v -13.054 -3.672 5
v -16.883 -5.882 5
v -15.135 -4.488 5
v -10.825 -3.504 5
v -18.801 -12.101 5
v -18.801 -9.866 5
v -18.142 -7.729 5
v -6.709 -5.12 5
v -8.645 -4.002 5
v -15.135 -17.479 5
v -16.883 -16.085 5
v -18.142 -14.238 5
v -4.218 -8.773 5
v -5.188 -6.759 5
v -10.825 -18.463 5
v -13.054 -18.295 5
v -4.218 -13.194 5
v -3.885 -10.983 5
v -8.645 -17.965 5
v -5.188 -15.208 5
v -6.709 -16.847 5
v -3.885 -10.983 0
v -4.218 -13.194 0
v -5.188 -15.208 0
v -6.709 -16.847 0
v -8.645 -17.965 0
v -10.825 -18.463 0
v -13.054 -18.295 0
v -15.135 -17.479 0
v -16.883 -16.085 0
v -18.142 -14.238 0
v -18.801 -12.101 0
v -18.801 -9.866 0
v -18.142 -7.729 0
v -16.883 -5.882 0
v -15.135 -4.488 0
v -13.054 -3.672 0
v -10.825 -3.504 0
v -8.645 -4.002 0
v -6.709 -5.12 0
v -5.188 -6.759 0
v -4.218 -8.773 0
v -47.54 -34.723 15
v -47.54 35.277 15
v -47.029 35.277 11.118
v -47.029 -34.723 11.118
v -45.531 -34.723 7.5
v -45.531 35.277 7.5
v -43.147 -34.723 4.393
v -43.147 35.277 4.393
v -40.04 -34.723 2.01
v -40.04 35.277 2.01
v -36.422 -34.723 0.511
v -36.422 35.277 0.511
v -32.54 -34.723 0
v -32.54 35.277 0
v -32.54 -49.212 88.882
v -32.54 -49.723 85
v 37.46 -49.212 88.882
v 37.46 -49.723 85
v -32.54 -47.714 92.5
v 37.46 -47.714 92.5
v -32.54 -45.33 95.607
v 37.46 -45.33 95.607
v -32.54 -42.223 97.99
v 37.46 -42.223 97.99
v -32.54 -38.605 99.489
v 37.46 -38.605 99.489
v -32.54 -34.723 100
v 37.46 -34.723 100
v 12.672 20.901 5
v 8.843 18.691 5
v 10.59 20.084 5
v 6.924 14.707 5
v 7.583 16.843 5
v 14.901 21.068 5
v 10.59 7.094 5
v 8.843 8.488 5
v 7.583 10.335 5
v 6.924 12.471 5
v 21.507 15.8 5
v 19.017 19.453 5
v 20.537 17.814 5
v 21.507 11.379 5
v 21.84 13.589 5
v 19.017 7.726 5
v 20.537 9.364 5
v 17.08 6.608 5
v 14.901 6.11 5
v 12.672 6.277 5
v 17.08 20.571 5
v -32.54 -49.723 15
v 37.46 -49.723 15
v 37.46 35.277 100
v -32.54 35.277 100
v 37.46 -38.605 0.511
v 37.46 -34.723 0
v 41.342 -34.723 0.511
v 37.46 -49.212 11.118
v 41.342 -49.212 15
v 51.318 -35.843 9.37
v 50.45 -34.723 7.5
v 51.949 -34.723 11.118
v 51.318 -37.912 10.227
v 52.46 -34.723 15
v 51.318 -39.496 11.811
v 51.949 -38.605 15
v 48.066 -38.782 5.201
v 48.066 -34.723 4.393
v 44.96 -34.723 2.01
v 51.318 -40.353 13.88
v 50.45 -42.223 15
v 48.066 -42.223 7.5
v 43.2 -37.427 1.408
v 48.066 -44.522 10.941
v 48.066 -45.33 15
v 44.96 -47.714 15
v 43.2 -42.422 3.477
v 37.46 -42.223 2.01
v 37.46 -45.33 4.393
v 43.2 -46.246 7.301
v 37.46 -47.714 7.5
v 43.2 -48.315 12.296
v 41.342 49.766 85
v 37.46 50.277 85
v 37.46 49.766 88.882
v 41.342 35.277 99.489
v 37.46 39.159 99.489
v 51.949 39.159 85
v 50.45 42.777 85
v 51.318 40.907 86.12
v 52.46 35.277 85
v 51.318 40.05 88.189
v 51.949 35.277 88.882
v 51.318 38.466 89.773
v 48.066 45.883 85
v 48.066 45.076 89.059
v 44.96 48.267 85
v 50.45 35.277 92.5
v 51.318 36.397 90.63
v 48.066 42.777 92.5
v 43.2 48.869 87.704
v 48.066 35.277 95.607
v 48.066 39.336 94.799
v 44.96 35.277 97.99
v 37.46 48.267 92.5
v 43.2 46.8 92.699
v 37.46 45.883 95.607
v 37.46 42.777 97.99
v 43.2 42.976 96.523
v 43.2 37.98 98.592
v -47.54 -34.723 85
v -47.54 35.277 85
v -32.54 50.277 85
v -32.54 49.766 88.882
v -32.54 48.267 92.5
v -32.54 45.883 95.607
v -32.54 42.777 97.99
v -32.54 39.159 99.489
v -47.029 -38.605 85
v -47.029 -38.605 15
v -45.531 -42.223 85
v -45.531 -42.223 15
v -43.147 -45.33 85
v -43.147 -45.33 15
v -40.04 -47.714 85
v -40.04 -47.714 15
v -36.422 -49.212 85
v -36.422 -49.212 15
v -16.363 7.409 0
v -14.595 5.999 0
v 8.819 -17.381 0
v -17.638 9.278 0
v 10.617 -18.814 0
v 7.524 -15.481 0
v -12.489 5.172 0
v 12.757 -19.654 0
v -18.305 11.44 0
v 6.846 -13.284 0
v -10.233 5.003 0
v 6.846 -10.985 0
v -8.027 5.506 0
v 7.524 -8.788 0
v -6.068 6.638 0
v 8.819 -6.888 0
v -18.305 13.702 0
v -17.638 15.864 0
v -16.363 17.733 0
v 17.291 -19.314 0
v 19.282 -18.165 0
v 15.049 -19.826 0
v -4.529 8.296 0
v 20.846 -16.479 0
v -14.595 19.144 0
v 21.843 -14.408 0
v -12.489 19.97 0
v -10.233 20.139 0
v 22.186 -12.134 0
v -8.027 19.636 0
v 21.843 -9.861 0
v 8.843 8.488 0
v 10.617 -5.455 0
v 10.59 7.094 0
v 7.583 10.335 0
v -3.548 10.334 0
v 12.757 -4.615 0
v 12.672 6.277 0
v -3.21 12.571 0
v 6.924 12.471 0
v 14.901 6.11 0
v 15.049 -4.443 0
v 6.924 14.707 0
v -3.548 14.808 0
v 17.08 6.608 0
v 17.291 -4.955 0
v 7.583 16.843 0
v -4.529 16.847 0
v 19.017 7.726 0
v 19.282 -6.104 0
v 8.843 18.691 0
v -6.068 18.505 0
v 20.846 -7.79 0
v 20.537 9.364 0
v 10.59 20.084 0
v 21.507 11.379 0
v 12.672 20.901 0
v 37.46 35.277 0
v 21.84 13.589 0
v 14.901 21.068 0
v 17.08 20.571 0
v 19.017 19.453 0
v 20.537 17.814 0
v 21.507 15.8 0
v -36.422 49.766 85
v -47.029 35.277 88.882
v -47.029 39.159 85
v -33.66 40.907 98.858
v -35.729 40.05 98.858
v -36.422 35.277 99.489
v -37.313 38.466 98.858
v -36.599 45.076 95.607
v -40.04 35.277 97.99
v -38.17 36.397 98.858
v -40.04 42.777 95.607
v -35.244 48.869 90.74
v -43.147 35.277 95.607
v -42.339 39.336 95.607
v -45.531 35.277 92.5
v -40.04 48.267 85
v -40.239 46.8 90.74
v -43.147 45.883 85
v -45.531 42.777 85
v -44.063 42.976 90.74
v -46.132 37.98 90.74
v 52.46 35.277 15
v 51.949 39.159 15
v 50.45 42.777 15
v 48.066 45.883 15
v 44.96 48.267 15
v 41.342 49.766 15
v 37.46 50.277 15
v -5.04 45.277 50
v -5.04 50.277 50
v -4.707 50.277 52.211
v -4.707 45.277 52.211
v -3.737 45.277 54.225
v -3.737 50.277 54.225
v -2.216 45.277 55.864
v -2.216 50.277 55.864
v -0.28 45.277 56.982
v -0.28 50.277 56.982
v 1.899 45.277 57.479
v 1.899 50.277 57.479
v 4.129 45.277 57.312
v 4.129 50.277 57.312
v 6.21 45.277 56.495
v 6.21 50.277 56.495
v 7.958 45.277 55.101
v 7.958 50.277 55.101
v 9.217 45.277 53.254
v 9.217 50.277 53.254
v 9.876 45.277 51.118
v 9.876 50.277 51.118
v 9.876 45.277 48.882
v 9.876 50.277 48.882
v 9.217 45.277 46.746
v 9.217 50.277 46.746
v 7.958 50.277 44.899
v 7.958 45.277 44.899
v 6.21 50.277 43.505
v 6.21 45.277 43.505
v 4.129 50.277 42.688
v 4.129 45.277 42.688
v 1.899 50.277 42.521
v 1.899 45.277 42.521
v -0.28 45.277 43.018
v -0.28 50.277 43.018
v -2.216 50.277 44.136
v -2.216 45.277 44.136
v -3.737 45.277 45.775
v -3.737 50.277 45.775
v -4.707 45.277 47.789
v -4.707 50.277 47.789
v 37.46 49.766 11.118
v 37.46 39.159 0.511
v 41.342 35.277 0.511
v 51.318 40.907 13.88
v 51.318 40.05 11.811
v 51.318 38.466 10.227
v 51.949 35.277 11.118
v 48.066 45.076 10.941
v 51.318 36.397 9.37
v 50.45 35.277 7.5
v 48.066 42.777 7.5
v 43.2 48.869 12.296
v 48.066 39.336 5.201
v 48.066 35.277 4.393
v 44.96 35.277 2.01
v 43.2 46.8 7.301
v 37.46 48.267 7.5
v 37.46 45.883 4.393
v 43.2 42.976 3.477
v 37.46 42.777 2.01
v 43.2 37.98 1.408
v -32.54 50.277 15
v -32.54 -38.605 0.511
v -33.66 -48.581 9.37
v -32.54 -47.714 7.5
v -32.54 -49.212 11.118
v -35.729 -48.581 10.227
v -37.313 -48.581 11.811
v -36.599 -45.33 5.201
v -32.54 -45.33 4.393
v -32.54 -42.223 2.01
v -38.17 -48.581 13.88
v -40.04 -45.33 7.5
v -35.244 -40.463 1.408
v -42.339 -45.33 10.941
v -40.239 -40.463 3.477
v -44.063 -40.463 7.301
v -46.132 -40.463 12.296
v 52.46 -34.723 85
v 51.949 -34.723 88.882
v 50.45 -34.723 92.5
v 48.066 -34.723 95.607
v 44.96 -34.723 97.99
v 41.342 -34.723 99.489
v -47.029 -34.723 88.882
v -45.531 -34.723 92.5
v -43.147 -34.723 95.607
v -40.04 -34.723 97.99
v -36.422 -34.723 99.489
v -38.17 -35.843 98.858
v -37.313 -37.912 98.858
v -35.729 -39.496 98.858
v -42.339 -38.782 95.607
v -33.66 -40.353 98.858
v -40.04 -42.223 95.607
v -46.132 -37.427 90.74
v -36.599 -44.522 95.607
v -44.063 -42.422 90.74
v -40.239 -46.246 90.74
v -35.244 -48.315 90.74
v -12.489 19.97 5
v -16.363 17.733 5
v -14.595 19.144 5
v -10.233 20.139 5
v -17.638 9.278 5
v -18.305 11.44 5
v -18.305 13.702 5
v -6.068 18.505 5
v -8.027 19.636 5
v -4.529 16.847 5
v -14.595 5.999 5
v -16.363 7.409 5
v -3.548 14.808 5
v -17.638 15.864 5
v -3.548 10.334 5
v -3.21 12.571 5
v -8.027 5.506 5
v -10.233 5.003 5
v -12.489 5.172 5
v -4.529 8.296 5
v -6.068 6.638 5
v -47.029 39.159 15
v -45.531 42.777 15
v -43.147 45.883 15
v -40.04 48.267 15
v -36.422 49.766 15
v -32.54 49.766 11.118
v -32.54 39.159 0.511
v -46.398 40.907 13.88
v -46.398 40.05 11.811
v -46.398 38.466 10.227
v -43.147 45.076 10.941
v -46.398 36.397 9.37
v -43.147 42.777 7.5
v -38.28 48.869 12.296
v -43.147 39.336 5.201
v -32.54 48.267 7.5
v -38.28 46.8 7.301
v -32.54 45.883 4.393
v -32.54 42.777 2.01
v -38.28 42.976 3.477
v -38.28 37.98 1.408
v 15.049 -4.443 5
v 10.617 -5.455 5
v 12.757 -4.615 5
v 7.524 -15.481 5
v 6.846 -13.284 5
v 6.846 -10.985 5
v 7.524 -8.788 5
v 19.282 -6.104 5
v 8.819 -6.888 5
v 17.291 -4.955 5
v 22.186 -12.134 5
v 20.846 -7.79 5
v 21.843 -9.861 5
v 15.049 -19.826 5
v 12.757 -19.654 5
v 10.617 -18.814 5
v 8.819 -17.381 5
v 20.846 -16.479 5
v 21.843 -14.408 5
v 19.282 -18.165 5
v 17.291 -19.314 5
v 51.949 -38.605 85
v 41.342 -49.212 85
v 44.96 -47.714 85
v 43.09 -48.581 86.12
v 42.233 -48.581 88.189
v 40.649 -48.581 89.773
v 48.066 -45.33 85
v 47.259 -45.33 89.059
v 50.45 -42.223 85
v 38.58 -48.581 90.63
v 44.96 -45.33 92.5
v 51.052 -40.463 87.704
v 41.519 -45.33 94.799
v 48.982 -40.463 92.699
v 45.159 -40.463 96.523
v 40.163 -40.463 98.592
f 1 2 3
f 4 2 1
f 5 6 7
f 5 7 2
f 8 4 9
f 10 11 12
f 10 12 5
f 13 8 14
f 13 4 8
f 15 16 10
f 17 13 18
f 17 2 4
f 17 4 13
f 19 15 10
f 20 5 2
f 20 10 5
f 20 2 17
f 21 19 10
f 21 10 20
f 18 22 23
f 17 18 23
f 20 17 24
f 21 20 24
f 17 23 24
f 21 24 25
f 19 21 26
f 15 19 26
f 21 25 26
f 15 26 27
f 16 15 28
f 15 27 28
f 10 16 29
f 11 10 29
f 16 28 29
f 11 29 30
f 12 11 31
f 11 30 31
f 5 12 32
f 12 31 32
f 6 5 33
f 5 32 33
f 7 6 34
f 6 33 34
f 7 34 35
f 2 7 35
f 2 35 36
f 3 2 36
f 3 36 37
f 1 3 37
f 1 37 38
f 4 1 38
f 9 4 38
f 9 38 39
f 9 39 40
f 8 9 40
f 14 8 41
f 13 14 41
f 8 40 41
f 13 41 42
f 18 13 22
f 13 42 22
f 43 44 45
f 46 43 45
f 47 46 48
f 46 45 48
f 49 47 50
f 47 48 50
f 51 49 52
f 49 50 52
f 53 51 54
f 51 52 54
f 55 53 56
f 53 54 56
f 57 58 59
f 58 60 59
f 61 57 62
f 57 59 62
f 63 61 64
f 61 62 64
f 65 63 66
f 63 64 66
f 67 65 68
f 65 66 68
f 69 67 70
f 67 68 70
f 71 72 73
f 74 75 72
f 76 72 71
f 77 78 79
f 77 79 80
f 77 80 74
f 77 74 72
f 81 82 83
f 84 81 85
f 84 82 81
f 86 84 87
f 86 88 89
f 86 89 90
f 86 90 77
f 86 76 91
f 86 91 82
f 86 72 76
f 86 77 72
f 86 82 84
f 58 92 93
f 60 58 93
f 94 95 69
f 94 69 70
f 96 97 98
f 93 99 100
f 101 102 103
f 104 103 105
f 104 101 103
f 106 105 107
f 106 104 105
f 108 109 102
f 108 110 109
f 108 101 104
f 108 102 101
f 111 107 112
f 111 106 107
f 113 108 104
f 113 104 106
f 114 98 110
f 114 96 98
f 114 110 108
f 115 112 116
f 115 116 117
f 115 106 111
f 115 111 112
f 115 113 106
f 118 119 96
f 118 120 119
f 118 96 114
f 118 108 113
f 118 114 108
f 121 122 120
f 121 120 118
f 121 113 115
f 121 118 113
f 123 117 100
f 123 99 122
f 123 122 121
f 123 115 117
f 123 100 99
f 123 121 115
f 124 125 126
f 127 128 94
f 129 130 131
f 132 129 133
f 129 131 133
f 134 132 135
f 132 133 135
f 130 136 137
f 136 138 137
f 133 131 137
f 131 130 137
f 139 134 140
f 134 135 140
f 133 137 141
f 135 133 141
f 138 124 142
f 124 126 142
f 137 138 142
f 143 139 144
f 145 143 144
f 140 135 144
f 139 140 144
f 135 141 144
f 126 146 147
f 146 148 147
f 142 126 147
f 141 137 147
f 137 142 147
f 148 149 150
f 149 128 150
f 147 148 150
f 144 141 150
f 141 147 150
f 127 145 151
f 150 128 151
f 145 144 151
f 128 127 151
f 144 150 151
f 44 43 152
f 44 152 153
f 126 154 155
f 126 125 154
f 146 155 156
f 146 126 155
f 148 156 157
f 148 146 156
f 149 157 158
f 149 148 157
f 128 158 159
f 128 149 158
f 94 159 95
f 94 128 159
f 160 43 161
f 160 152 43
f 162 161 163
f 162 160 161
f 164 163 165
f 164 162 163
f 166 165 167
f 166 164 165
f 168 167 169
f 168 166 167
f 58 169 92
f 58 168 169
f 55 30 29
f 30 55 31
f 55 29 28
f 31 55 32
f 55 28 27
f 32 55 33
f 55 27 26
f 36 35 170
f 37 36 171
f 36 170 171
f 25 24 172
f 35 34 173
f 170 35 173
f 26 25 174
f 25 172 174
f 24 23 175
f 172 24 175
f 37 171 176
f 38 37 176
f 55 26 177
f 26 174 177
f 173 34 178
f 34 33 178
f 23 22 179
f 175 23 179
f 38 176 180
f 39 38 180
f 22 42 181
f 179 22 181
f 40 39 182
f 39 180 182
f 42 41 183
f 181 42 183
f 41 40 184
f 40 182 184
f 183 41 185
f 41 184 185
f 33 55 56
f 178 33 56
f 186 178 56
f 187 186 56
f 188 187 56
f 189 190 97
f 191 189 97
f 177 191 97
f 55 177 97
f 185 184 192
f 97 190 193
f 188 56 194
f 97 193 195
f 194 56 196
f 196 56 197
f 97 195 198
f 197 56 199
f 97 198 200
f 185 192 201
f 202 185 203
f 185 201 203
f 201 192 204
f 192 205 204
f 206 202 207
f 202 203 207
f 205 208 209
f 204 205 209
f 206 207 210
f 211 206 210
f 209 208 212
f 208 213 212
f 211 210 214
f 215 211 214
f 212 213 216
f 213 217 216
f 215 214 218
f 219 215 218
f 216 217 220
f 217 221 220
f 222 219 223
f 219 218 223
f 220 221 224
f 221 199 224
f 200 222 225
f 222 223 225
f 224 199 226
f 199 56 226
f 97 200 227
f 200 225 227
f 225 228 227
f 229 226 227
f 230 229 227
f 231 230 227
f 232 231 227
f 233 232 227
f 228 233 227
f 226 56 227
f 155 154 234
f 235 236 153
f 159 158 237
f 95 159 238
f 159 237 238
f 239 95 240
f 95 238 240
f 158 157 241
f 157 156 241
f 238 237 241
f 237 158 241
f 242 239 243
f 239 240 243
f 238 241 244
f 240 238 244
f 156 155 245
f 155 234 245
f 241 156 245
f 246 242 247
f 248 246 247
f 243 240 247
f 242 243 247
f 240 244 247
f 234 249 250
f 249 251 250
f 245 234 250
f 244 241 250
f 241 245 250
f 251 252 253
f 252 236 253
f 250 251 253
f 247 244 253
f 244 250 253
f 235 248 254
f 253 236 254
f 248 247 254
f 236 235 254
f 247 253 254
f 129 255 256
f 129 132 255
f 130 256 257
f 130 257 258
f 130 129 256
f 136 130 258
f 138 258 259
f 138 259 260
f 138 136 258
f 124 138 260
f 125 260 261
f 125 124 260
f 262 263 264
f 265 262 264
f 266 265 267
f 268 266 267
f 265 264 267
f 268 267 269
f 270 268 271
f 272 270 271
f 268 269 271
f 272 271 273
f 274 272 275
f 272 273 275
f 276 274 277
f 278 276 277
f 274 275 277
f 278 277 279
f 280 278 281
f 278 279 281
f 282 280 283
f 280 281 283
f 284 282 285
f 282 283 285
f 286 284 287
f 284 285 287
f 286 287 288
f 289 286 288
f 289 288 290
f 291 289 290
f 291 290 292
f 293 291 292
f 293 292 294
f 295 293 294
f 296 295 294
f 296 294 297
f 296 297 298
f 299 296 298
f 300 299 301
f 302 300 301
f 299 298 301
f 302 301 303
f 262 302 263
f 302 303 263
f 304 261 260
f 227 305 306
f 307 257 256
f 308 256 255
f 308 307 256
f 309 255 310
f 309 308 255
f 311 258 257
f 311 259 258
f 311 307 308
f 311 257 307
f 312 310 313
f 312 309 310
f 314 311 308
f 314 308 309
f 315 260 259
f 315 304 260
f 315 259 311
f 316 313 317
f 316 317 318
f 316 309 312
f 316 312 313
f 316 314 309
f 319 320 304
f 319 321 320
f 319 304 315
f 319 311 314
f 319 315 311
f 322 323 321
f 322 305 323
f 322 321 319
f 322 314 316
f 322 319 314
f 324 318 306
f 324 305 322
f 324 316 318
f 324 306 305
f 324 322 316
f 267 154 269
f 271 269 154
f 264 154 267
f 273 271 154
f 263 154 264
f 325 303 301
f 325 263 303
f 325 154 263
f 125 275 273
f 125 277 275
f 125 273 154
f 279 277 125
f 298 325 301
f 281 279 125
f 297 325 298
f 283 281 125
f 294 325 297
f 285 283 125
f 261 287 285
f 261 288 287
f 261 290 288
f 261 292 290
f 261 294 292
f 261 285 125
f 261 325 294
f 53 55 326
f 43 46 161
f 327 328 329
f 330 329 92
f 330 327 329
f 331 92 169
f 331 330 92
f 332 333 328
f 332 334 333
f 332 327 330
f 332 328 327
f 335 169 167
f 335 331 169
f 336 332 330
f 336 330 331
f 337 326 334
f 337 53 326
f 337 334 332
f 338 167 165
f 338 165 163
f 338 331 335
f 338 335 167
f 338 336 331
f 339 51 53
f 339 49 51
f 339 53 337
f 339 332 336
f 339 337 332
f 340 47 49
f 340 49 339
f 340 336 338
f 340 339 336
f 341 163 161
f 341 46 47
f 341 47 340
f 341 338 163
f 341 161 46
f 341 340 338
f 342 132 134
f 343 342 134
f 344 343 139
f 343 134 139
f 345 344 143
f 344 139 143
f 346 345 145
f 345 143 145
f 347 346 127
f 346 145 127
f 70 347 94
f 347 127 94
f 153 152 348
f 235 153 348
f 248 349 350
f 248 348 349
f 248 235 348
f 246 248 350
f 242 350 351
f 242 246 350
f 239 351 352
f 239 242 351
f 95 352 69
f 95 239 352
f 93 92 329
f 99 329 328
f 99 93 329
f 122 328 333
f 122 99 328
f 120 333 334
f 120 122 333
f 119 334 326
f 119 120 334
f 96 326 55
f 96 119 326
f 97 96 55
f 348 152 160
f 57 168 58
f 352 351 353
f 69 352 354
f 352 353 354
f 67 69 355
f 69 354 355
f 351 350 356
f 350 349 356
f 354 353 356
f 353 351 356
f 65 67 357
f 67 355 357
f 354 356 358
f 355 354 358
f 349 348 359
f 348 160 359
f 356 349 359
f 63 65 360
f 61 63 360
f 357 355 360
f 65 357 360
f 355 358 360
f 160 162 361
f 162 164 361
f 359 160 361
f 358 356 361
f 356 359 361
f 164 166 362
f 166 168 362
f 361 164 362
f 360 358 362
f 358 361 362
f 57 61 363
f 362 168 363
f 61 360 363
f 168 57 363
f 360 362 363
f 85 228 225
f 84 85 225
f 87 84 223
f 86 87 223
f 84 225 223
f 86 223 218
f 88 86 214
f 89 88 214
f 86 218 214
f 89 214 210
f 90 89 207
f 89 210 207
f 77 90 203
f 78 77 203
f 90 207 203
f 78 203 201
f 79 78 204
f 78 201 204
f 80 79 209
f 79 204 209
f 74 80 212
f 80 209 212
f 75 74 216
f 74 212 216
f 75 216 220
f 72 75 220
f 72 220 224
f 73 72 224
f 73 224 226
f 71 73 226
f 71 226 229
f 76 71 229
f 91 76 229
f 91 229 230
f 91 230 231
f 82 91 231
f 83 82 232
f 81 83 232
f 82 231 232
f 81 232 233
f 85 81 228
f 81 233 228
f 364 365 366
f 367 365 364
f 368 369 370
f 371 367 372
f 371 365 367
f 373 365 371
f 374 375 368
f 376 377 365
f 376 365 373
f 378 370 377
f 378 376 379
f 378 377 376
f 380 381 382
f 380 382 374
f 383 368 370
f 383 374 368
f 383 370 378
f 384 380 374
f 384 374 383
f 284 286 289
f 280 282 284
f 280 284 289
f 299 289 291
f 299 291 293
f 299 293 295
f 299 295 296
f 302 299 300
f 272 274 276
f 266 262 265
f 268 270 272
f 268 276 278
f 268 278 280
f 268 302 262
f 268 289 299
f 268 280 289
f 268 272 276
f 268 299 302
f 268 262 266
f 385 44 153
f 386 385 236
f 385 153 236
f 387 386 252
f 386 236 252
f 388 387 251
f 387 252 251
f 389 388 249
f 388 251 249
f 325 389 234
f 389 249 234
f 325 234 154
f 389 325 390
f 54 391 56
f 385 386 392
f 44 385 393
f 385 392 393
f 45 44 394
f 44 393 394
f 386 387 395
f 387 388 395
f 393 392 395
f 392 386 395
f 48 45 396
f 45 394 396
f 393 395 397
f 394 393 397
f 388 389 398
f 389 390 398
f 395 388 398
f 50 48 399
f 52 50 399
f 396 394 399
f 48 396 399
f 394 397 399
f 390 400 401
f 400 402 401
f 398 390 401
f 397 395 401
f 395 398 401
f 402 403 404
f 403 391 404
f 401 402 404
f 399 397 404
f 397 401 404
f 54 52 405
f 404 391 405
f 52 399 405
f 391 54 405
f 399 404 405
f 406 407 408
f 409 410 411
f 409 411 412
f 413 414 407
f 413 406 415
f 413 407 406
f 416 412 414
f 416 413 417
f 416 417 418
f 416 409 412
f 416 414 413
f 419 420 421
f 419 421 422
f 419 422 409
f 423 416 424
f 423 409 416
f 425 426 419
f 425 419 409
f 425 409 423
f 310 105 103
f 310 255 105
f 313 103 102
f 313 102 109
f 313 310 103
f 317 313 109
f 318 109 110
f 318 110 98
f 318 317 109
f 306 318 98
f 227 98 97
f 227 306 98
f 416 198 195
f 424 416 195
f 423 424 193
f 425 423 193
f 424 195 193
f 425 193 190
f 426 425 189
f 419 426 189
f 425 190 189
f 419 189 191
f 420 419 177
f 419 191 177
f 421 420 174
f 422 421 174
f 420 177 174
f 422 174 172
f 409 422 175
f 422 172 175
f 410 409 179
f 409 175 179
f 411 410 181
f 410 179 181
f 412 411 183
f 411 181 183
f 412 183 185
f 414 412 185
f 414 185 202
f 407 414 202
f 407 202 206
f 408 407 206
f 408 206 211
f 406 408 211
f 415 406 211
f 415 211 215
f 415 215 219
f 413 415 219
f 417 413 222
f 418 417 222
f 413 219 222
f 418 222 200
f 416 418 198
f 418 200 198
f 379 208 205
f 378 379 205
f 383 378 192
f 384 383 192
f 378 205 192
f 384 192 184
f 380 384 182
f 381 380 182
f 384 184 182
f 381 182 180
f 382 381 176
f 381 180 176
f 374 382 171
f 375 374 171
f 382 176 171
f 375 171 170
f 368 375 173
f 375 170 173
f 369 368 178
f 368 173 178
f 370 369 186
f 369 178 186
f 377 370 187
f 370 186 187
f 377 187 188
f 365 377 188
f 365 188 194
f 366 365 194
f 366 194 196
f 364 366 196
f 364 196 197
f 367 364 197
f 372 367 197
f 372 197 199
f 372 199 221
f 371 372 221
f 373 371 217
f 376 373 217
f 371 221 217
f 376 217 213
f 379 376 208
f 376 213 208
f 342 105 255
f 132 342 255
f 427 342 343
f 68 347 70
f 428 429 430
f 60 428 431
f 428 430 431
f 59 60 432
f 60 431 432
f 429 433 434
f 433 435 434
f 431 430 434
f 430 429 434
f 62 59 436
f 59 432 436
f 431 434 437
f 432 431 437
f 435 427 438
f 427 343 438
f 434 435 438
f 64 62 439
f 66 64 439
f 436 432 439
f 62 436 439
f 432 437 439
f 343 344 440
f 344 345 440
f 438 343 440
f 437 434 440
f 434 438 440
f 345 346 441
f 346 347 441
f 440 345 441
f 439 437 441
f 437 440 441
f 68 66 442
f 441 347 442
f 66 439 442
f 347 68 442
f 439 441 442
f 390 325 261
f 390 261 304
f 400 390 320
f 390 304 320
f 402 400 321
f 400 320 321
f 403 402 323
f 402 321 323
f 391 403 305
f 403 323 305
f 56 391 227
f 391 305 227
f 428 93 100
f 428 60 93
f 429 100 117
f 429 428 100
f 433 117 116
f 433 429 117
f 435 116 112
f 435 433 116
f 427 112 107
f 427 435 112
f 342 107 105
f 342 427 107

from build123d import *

# Parameters (mm, degrees)
F0_W     = 100
F0_H     = 100
F1_DEPTH = 100
F2_R     = 15
F3_R     = 7.5
F4_DEPTH = 5
F5_R     = 7.5
F5_R_2   = 7.589466
F5_R_3   = 7.712973
F6_DEPTH = 5


with BuildPart() as f1:
    # F0 (on Top) → F1 (new body)
    with BuildSketch(Plane.XY):
        with Locations((2.459805, 0.276836)):
            Rectangle(F0_W, F0_H)
    extrude(amount=F1_DEPTH)

    # F2
    f2_edges = [f1.edges().sort_by_distance(p)[0] for p in [
        (2.459805, 50.276836, 0),
        (-47.540195, 50.276836, 50),
        (2.459805, 50.276836, 100),
        (52.459805, 50.276836, 50),
        (-47.540195, 0.276836, 0),
        (2.459805, -49.723164, 0),
        (52.459805, 0.276836, 0),
        (-47.540195, -49.723164, 50),
        (-47.540195, 0.276836, 100),
        (52.459805, 0.276836, 100),
        (52.459805, -49.723164, 50),
        (2.459805, -49.723164, 100),
    ]]
    fillet(f2_edges, radius=F2_R)

    # F3 (on face) → F4 (cut)
    with BuildSketch(Plane(origin=(0, 50.276836, 0), x_dir=(-1, 0, 0), z_dir=(0, 1, 0))):
        with Locations((-2.459805, 50)):
            Circle(F3_R)
    extrude(amount=-F4_DEPTH, mode=Mode.SUBTRACT)

    # F5 (on face) → F6 (cut)
    with BuildSketch(Plane(origin=(0, 0, 0), x_dir=(1, 0, 0), z_dir=(0, 0, -1))):
        with Locations((14.340434, -13.589303)):
            Circle(F5_R)
        with Locations((-10.799815, -12.571245)):
            Circle(F5_R_2)
        with Locations((14.473066, 12.134452)):
            Circle(F5_R_3)
        with Locations((-11.385111, 10.983491)):
            Circle(F5_R)
    extrude(amount=-F6_DEPTH, mode=Mode.SUBTRACT)


solid = f1.part
